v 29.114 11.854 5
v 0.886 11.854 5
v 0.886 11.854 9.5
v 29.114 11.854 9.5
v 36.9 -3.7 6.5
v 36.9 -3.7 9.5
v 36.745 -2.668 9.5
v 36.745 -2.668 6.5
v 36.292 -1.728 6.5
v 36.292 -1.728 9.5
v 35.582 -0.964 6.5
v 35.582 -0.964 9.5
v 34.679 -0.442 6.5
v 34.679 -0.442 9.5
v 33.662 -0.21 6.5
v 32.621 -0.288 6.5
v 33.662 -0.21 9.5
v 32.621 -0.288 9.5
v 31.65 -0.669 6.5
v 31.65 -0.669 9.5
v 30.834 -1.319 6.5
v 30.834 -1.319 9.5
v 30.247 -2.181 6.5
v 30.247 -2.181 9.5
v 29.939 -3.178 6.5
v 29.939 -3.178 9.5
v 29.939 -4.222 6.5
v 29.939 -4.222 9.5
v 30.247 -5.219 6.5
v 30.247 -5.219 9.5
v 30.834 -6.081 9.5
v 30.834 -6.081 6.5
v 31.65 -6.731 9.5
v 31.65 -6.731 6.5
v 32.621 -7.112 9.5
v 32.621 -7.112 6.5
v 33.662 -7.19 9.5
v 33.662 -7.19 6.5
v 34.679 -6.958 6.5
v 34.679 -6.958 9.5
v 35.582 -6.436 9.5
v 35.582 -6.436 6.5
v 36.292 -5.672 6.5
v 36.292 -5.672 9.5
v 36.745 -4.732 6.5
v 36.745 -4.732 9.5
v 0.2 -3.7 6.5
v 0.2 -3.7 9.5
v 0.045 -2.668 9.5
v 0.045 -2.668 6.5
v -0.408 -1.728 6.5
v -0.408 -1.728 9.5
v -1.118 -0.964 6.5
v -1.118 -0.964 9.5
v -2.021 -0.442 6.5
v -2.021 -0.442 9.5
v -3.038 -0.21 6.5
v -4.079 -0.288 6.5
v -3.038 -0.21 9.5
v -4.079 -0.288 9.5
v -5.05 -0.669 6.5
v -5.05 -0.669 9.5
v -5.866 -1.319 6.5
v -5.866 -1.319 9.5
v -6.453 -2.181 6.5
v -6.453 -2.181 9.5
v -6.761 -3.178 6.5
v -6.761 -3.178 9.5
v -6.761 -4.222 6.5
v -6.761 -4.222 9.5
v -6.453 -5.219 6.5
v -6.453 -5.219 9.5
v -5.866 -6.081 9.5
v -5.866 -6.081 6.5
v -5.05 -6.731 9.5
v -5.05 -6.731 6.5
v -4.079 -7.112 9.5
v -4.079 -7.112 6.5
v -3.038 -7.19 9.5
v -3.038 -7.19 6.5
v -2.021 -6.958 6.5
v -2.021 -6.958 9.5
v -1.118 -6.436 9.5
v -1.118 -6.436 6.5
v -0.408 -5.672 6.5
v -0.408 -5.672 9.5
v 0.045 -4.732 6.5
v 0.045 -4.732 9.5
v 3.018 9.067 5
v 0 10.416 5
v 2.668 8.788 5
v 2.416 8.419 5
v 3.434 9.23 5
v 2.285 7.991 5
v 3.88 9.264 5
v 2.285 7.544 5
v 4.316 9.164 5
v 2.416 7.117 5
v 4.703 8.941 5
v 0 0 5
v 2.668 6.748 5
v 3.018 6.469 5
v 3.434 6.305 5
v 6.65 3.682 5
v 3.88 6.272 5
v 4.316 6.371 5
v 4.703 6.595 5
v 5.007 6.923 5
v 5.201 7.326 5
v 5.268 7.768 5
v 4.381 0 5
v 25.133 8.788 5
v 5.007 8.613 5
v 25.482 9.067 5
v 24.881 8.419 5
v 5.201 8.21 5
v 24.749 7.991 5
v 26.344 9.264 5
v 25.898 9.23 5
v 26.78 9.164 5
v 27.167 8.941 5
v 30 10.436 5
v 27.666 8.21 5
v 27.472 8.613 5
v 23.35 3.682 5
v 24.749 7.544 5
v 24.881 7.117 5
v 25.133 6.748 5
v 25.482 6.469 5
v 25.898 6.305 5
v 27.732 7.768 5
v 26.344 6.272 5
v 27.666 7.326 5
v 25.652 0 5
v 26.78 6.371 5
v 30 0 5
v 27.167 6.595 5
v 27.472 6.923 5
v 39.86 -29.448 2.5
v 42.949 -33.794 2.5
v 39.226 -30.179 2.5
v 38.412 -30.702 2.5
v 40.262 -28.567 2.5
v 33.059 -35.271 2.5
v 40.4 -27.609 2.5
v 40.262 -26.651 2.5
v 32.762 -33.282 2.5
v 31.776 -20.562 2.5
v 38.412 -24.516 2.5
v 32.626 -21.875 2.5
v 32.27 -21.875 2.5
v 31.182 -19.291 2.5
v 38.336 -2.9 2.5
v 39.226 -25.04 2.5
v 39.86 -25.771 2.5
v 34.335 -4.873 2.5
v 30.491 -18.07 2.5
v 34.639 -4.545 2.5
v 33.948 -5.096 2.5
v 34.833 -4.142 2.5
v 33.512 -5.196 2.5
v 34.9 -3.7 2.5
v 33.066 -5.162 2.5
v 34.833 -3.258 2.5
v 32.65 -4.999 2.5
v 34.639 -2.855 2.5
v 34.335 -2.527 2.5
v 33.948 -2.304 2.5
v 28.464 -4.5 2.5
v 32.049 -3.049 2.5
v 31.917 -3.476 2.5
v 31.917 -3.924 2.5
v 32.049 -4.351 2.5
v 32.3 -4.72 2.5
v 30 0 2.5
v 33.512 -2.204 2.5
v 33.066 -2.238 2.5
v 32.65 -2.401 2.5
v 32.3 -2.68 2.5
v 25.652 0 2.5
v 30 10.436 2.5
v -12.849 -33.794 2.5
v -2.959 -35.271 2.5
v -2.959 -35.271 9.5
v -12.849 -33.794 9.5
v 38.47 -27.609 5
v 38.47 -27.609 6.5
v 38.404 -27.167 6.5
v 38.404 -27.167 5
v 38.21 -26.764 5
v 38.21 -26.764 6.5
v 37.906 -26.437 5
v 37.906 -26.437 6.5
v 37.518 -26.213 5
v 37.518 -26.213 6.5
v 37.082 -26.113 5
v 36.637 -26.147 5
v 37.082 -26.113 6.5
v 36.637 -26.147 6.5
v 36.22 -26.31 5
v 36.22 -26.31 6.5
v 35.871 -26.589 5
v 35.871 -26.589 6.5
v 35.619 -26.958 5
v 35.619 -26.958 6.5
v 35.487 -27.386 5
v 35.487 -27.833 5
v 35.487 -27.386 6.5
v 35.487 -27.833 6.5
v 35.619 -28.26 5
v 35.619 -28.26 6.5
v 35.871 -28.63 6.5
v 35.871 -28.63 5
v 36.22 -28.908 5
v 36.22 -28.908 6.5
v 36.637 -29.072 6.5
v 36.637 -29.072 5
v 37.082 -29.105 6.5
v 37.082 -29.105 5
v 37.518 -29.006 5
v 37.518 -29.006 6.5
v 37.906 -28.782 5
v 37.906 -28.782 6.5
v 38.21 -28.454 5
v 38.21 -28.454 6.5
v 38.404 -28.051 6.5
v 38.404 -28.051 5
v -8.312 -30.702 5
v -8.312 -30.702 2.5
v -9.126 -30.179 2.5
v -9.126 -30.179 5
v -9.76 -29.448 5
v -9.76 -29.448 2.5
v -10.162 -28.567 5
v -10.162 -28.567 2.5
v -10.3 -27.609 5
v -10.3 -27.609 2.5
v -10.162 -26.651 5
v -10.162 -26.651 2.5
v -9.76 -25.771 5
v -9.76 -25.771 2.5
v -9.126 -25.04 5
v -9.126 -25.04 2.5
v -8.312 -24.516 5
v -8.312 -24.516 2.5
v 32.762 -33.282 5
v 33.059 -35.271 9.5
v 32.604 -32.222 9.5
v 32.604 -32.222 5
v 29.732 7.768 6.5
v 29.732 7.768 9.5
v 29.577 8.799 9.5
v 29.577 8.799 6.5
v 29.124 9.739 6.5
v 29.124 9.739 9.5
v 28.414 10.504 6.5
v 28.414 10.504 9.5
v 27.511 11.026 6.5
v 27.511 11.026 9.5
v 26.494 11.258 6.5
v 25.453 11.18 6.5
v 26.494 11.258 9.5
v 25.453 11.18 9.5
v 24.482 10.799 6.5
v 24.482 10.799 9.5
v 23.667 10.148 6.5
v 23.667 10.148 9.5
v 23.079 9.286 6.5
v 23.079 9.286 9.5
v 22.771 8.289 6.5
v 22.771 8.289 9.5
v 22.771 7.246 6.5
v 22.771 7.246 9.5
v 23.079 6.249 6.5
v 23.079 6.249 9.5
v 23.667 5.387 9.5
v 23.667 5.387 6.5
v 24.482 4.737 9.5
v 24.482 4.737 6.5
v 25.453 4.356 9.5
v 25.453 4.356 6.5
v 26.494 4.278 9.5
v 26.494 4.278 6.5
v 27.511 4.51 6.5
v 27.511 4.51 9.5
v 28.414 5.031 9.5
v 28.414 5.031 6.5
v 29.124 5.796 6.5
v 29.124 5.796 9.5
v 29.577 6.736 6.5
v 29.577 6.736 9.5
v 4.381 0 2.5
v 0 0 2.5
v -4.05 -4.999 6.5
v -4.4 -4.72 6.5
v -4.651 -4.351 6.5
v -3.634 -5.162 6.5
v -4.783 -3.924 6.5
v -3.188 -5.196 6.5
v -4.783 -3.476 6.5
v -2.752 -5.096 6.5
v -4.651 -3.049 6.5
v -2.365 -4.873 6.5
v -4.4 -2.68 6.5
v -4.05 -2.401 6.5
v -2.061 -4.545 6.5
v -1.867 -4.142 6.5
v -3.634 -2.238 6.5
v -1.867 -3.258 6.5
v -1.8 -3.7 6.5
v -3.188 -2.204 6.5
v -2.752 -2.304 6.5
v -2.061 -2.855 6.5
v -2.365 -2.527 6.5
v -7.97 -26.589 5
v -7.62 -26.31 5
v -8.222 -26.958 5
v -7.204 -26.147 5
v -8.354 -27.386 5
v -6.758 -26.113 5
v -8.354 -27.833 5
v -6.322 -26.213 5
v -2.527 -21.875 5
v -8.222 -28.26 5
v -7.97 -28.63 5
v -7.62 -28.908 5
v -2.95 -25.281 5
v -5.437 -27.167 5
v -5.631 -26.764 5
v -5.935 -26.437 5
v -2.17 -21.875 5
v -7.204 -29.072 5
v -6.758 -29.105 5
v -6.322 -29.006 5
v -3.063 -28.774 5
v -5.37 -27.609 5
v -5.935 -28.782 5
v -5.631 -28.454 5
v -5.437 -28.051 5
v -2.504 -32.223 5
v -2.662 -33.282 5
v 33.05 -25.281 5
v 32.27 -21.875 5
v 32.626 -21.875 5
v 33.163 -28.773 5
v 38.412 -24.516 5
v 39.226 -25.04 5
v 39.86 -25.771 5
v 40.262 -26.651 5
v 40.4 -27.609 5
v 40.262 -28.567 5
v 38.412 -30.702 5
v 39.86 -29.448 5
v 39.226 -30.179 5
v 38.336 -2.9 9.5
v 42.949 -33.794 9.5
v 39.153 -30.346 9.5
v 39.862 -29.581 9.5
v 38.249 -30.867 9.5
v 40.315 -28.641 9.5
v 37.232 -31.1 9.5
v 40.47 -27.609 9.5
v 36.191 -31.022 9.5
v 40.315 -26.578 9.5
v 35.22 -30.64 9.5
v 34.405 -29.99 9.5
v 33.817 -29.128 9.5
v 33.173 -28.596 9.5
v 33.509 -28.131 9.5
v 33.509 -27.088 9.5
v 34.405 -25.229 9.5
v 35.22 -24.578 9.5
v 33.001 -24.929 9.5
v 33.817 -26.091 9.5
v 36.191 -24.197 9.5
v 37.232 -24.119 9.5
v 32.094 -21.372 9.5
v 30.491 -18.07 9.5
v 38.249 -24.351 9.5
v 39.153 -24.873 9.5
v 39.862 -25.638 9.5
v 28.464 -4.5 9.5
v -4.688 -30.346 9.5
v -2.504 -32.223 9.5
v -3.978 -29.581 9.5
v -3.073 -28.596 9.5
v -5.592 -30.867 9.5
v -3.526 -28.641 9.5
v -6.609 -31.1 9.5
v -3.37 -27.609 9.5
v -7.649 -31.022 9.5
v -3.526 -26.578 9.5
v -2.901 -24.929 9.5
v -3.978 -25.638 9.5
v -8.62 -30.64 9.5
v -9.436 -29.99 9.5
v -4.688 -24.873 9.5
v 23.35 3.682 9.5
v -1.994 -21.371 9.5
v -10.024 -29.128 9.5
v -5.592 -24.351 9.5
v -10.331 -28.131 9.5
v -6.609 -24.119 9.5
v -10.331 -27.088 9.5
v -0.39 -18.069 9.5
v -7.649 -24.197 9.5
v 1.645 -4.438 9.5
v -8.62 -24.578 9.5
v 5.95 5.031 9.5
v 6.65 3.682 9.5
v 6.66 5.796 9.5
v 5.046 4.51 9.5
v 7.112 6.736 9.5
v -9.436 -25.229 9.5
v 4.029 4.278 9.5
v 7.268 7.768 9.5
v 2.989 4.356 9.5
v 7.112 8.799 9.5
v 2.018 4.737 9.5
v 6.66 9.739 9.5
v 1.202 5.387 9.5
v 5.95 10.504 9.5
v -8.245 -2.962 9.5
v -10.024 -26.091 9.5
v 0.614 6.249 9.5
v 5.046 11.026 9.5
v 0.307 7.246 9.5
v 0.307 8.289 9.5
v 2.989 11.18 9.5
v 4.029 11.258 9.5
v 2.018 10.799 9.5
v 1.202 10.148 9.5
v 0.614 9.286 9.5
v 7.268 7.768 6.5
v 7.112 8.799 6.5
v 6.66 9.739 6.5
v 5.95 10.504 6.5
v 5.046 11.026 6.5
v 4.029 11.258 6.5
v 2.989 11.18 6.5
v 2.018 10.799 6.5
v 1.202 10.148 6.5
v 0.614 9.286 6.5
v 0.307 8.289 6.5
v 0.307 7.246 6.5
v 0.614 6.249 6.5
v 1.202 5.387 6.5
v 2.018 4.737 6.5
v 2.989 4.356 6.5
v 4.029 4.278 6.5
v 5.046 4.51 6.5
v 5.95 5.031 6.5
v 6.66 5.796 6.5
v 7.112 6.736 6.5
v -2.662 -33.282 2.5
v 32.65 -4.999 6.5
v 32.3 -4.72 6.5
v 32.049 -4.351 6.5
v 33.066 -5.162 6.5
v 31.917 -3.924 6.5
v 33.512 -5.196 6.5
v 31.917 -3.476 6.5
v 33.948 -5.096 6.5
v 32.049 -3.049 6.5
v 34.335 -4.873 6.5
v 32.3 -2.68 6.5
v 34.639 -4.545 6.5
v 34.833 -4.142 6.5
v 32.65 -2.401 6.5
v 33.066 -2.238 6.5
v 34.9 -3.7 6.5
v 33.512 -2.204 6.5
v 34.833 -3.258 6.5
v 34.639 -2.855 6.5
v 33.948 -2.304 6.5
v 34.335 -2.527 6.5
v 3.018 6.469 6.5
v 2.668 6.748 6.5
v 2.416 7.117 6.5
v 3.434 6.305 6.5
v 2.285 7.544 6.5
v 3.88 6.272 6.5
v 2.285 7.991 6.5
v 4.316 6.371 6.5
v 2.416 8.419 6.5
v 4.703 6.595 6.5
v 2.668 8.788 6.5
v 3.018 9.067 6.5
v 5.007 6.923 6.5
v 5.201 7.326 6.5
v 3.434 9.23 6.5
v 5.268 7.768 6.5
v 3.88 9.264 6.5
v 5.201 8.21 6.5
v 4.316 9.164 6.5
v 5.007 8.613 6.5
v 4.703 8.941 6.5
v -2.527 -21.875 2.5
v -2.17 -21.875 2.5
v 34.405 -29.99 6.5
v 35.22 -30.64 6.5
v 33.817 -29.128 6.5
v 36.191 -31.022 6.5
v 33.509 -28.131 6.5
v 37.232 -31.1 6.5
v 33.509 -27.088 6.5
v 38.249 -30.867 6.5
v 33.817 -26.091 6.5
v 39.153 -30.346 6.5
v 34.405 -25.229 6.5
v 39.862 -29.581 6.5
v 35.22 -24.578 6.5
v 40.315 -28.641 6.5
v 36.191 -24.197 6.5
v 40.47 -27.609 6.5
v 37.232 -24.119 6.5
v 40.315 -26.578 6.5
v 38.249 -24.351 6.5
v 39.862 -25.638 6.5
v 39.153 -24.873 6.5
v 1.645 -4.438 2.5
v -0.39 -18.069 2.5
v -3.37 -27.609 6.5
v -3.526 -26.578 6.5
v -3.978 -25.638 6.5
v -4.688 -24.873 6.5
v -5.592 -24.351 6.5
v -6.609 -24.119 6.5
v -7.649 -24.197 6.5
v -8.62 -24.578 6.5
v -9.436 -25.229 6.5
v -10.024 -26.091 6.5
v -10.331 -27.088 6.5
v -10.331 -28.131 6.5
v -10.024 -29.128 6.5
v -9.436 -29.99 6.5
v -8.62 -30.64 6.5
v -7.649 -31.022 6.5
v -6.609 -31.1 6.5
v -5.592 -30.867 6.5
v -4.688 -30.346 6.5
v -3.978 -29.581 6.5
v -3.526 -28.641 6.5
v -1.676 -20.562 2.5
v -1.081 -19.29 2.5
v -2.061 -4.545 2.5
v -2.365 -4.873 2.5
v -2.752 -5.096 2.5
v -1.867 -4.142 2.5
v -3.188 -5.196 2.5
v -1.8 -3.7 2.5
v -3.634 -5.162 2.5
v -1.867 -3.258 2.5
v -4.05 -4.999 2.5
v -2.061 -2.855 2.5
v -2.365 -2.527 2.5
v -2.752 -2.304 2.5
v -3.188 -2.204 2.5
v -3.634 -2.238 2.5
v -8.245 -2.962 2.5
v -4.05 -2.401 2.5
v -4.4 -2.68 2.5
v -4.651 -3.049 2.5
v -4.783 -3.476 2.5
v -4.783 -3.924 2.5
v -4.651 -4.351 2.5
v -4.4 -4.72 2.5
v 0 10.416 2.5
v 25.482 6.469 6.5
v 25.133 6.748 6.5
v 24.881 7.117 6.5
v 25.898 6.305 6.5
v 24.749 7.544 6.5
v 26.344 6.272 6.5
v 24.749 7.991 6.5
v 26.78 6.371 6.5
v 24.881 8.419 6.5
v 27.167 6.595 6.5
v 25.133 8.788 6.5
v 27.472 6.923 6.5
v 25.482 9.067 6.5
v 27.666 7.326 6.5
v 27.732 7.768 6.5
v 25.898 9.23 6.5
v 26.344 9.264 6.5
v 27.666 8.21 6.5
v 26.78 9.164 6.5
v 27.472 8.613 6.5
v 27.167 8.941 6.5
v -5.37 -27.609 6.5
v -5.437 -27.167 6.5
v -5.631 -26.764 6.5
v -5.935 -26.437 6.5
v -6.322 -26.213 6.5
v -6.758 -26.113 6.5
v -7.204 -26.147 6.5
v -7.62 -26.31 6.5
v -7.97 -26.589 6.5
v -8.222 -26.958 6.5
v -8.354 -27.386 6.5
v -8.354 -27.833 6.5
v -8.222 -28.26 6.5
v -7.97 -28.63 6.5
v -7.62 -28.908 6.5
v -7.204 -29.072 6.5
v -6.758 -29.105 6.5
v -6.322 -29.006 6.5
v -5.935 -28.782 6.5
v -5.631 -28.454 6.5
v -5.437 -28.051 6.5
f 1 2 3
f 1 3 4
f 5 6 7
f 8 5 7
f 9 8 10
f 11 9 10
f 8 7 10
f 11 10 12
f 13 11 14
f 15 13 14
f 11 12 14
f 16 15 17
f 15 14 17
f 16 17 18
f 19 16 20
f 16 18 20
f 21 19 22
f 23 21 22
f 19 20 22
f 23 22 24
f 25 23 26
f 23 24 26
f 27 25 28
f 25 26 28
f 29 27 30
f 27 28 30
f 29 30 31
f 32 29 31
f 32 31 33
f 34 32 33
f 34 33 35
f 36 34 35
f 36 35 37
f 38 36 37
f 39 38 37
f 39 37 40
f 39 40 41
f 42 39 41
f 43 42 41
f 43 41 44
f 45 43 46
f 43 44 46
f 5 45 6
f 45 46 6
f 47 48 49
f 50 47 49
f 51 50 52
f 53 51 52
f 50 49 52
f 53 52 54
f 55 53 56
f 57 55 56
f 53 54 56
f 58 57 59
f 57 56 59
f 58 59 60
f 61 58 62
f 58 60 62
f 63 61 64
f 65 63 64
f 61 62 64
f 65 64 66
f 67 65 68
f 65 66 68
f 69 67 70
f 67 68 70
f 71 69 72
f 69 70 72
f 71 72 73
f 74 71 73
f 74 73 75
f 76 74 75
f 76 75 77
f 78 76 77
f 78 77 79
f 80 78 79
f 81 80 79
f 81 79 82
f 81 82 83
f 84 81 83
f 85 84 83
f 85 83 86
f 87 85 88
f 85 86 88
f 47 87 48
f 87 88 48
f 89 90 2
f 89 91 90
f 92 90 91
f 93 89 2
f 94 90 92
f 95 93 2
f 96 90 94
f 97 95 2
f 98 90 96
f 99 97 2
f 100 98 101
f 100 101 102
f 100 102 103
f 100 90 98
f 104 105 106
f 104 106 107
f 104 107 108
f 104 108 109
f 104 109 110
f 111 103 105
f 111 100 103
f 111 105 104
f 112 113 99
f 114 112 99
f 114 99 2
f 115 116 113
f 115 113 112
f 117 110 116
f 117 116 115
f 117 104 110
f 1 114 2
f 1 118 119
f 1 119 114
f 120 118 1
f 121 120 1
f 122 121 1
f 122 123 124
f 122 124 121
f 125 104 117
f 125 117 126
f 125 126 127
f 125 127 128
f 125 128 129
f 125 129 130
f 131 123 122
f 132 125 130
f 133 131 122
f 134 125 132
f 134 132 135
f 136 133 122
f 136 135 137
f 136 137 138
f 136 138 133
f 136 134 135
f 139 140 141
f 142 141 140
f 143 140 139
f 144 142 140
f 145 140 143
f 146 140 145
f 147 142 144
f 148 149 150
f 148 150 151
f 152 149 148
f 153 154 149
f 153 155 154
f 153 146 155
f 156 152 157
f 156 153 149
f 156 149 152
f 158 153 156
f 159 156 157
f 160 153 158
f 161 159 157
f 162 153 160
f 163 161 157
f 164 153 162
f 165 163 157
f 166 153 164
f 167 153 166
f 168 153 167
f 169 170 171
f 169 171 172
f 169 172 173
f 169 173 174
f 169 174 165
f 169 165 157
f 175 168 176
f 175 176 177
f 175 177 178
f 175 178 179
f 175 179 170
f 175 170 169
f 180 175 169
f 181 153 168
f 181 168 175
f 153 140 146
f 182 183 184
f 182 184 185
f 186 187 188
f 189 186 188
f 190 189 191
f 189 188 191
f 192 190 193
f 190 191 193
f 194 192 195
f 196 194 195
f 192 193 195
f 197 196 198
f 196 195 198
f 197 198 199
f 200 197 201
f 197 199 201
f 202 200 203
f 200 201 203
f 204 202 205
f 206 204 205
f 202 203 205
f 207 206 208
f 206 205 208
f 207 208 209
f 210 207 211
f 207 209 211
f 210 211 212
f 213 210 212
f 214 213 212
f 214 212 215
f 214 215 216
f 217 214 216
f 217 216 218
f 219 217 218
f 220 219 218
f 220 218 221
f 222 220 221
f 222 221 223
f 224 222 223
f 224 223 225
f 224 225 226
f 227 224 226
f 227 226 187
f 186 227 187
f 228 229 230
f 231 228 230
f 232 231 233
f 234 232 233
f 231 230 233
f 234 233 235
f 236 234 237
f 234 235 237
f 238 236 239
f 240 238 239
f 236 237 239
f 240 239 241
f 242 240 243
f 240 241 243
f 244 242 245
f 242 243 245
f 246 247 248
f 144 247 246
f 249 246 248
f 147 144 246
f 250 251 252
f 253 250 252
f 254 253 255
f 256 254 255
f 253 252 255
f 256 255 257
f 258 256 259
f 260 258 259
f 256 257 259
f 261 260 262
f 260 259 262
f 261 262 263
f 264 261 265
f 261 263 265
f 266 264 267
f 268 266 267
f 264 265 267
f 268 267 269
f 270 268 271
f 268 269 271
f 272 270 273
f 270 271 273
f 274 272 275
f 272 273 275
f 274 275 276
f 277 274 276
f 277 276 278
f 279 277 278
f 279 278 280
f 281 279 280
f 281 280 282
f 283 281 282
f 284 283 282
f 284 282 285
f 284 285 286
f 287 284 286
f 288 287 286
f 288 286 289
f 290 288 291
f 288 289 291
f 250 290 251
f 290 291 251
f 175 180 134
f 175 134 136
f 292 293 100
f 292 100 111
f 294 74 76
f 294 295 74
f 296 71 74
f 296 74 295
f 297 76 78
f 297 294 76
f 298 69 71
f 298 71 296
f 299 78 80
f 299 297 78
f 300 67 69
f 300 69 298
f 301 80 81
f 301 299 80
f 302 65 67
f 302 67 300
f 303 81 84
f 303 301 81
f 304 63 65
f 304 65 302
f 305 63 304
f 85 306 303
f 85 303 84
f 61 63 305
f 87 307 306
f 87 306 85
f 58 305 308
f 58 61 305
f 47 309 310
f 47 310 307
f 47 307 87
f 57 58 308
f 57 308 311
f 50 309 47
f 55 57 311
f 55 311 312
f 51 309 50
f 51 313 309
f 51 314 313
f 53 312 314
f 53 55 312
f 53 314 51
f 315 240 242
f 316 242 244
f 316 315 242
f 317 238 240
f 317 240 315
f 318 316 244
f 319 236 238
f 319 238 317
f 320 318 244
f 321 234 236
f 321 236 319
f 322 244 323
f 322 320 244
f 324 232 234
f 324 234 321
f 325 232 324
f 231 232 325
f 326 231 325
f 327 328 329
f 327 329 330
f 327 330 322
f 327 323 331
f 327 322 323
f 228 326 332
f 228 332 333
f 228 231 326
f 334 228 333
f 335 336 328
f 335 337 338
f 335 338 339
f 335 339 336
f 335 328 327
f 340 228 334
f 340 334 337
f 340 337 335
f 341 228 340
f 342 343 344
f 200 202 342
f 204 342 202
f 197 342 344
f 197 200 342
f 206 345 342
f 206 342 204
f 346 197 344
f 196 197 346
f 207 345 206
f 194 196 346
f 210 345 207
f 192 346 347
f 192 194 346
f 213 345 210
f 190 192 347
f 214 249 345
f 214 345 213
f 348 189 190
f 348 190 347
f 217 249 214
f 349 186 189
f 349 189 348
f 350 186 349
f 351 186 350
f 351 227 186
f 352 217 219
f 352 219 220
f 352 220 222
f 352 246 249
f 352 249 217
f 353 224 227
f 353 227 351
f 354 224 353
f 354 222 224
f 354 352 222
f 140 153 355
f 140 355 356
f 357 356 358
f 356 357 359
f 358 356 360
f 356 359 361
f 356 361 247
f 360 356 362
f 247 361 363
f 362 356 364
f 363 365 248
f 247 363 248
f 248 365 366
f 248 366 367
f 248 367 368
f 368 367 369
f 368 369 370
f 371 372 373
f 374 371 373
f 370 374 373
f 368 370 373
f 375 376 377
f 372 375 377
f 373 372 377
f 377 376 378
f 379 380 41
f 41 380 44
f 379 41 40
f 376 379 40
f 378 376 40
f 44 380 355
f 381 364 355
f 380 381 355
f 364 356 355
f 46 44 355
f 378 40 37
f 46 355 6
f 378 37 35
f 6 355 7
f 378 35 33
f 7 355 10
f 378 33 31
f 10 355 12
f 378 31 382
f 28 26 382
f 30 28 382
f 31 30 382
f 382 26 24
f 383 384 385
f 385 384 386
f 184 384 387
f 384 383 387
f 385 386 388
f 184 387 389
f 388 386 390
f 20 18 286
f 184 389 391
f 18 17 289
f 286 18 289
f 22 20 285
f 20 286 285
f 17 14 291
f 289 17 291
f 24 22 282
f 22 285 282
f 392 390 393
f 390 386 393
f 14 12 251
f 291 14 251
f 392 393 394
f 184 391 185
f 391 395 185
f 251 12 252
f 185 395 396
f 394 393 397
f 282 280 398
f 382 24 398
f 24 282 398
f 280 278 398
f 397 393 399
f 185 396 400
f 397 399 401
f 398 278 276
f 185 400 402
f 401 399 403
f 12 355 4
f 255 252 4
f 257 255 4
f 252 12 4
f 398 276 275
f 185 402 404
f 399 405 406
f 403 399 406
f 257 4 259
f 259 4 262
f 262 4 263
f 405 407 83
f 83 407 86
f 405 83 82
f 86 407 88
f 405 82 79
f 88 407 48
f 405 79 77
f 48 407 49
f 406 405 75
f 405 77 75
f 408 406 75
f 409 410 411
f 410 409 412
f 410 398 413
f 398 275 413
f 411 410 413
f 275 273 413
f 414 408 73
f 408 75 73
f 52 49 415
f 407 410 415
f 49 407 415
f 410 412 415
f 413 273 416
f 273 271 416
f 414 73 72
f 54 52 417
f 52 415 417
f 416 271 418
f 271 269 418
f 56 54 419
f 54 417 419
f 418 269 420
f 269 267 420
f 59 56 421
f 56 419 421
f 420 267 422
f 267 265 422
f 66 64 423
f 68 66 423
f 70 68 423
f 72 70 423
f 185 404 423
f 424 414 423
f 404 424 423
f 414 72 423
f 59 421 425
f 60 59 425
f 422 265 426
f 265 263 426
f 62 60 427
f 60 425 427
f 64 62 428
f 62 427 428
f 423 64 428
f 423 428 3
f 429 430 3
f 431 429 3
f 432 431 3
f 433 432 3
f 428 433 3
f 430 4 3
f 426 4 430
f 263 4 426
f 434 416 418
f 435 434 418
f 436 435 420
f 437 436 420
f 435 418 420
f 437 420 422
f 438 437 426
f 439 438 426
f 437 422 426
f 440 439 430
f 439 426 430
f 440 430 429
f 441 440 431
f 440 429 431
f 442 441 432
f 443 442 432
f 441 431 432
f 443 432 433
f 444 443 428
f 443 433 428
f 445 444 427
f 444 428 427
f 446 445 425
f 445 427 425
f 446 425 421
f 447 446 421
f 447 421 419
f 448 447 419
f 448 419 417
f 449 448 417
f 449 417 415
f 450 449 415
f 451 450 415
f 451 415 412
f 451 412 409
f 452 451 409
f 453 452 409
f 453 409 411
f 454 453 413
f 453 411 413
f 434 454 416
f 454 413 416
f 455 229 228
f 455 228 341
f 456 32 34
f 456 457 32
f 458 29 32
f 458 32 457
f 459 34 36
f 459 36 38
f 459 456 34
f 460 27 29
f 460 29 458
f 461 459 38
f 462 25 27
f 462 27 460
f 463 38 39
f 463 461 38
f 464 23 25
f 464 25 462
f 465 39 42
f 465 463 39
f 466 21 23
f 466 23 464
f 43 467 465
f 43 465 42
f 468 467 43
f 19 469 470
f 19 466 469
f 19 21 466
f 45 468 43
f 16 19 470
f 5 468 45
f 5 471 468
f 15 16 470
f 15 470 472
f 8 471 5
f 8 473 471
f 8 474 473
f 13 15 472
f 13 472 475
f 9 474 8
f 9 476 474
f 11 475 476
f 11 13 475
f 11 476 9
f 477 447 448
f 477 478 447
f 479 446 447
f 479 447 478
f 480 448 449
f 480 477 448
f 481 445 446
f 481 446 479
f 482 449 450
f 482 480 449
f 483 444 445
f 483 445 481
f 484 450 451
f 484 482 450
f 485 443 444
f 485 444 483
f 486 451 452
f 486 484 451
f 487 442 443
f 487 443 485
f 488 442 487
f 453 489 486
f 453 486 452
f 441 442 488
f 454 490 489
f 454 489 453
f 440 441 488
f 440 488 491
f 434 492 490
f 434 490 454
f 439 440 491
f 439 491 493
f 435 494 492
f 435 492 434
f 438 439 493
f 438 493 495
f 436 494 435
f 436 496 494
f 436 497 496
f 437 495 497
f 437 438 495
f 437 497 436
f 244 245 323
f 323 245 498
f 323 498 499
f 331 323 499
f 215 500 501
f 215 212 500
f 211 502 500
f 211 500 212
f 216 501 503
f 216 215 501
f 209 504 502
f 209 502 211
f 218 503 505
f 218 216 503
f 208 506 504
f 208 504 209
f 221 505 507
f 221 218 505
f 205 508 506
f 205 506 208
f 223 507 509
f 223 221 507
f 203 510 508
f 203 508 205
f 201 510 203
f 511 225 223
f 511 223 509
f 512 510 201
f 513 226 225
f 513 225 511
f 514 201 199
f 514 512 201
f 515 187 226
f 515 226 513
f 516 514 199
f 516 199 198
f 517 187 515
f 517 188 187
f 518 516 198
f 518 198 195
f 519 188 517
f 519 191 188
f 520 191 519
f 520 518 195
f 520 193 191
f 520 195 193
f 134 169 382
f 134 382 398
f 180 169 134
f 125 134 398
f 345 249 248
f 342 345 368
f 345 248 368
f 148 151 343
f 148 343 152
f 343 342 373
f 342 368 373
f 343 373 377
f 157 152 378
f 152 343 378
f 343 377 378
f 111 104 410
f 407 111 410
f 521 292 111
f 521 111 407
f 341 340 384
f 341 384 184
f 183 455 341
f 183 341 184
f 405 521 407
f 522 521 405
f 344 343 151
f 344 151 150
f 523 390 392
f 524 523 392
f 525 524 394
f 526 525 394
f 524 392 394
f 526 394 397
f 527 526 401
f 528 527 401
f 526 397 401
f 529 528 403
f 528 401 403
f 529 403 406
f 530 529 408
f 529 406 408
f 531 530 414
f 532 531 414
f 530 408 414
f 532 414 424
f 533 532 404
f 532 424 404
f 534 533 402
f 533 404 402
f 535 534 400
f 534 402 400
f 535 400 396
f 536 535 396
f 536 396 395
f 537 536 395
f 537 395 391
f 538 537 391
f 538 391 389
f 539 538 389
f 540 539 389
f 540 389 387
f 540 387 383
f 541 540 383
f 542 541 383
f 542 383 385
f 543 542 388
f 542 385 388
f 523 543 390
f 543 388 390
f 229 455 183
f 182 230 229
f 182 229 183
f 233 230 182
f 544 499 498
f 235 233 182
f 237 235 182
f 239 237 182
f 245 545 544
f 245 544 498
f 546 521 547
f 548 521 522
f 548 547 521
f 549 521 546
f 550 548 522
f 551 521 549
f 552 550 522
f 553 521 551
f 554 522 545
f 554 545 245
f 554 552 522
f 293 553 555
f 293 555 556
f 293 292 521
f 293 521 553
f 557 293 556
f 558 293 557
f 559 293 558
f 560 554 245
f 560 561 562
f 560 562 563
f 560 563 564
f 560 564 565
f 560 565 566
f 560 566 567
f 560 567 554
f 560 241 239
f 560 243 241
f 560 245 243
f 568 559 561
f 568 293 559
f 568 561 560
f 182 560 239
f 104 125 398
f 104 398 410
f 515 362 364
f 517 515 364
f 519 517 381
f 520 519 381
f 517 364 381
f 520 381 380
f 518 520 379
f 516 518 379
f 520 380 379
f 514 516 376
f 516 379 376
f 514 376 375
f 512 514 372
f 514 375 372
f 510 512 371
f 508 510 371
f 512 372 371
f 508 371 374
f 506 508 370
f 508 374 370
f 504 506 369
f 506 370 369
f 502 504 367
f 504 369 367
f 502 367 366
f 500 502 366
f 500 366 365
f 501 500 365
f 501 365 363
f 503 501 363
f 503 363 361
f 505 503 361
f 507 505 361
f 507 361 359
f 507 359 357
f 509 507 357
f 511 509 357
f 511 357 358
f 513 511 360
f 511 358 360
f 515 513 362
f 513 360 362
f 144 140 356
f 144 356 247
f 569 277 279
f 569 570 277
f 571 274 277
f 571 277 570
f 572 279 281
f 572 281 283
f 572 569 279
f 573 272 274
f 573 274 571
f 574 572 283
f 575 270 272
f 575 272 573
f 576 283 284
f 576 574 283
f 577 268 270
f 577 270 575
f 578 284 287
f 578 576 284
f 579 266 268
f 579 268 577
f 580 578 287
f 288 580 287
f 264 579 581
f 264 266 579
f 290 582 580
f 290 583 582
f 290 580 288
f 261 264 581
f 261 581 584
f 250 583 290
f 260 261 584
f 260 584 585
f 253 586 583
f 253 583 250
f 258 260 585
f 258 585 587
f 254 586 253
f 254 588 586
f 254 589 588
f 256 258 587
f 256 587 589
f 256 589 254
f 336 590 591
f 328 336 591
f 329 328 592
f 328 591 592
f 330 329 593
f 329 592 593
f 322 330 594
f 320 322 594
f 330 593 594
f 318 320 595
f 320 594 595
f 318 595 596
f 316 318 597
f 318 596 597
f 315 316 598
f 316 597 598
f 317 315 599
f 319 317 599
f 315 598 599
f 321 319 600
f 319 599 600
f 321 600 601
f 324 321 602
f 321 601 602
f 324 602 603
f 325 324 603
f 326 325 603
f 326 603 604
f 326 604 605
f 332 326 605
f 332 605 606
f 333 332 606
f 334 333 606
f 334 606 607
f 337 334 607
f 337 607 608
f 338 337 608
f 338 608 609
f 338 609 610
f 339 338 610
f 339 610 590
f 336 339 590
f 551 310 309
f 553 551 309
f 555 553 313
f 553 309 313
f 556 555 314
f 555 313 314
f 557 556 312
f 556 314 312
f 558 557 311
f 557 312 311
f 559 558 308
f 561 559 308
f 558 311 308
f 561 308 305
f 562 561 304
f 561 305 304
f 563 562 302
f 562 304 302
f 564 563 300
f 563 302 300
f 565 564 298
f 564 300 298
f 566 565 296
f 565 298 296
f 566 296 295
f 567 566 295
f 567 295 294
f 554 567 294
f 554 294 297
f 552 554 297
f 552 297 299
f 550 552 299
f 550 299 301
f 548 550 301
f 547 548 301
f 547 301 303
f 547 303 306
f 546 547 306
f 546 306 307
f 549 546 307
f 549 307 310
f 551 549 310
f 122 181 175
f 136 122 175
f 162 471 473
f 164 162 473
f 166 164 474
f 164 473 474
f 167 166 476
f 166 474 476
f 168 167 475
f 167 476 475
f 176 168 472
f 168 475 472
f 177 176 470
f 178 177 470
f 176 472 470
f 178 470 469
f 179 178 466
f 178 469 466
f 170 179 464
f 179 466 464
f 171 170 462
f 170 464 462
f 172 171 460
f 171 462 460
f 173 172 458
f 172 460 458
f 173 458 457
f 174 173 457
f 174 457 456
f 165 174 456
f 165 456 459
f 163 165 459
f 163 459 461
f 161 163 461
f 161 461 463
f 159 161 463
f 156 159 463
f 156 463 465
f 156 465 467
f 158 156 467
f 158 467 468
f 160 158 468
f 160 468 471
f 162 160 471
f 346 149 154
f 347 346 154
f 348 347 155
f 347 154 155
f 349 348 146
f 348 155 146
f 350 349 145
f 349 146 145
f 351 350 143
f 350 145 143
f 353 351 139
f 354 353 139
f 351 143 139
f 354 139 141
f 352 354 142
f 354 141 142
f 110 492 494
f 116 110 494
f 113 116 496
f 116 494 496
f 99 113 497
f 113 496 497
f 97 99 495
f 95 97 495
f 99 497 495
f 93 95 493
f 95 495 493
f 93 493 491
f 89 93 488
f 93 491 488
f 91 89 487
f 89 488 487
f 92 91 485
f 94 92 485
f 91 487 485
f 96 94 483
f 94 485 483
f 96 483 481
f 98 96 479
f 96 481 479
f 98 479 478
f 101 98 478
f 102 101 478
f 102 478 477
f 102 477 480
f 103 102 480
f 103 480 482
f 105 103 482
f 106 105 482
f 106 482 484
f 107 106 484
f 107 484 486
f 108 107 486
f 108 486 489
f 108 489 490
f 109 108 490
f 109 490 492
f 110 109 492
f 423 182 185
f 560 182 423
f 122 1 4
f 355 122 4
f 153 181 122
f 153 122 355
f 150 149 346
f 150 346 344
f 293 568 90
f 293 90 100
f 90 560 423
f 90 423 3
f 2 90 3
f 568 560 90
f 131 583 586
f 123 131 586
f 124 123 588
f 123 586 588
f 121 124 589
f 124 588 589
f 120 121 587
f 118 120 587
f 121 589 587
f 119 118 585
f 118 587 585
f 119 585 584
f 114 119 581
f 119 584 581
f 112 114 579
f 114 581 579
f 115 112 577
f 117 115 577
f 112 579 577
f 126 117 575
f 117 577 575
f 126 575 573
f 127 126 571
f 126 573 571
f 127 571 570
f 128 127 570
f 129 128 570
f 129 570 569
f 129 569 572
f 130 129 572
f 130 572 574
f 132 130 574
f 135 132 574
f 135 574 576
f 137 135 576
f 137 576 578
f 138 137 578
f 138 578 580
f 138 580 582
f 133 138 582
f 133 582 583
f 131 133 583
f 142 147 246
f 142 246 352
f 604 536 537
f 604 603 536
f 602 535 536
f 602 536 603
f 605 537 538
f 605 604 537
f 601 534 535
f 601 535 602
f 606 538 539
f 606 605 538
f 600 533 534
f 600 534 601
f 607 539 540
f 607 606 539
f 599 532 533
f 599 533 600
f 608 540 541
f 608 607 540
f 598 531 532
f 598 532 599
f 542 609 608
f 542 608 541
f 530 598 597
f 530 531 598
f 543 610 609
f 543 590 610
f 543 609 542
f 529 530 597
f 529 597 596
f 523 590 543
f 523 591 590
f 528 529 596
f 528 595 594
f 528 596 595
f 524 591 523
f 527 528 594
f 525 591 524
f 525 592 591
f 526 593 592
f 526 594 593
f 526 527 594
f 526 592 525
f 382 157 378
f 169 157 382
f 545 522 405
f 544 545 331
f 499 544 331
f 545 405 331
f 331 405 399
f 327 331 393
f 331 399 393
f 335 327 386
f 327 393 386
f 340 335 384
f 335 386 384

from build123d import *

# Parameters (mm, degrees)
PAD020_DEPTH    = 7
SKETCH043_W     = 30
SKETCH043_H     = 11.8536046546
POCKET018_DEPTH = 2.5
SKETCH044_R     = 1.5
POCKET019_DEPTH = 10
SKETCH045_R     = 3.5
POCKET020_DEPTH = 3
SKETCH046_R     = 18.15
POCKET021_DEPTH = 10
POCKET022_DEPTH = 2.5


with BuildPart() as part:
    # Sketch042 → Pad020 (new body)
    with BuildSketch(Plane.XY):
        Polygon((-12.8493066257, -33.7940933811), (-8.2452066191, -2.9618052463), (0.8857658642, 11.8536046546), (29.1142341358, 11.8536046546), (38.335521046, -2.8996050949), (42.948959357, -33.794429076), (33.0593993066, -35.2712096281), (28.4644789539, -4.5003949051), (23.3502319582, 3.6819292513), (6.6497680418, 3.6819292513), (1.6452066191, -4.4381947537), (-2.9589691174, -35.2709900288), align=None)
    extrude(amount=PAD020_DEPTH)

    # Sketch043 (on Face13 of Pad020) → Pocket018 (cut)
    with BuildSketch(Plane(origin=(0, 0, 0), x_dir=(1, 0, 0), z_dir=(0, 0, -1))):
        with Locations((15, -5.9268023273)):
            Rectangle(SKETCH043_W, SKETCH043_H)
    extrude(amount=-POCKET018_DEPTH, mode=Mode.SUBTRACT)

    # Sketch044 (on Face5 of Pocket018) → Pocket019 (cut)
    with BuildSketch(Plane.XY.offset(7)):
        with Locations((3.767766953, 7.767766953)):
            Circle(SKETCH044_R)
        with Locations((26.232233047, 7.767766953)):
            Circle(SKETCH044_R)
        with Locations((-6.8703102168, -27.60930544)):
            Circle(SKETCH044_R)
        with Locations((36.9703102168, -27.60930544)):
            Circle(SKETCH044_R)
        with Locations((33.4, -3.7)):
            Circle(SKETCH044_R)
        with Locations((-3.3, -3.7)):
            Circle(SKETCH044_R)
    extrude(amount=-POCKET019_DEPTH, mode=Mode.SUBTRACT)

    # Sketch045 (on Face5 of Pocket019) → Pocket020 (cut)
    with BuildSketch(Plane.XY.offset(7)):
        with Locations((36.9703102168, -27.60930544)):
            Circle(SKETCH045_R)
        with Locations((33.4, -3.7)):
            Circle(SKETCH045_R)
        with Locations((26.232233047, 7.767766953)):
            Circle(SKETCH045_R)
        with Locations((3.767766953, 7.767766953)):
            Circle(SKETCH045_R)
        with Locations((-3.3, -3.7)):
            Circle(SKETCH045_R)
        with Locations((-6.8703102168, -27.60930544)):
            Circle(SKETCH045_R)
    extrude(amount=-POCKET020_DEPTH, mode=Mode.SUBTRACT)

    # Sketch046 (on Face5 of Pocket020) → Pocket021 (cut)
    with BuildSketch(Plane.XY.offset(7)):
        with Locations((15.05, -27.60930544)):
            Circle(SKETCH046_R)
    extrude(amount=-POCKET021_DEPTH, mode=Mode.SUBTRACT)

    # Sketch047 (on Face4 of Pocket021) → Pocket022 (cut)
    with BuildSketch(Plane(origin=(0, 0, 0), x_dir=(1, 0, 0), z_dir=(0, 0, -1))):
        with BuildLine():
            ThreePointArc((-8.3120846255, 30.7022032745), (-10.3000000009, 27.6093139691), (-8.3121001429, 24.5164146902))
            Line((-8.3121001429, 24.5164146902), (-2.5265008251, 21.8749228678))
            Line((-2.5265008251, 21.8749228678), (32.6264961364, 21.8749207273))
            Line((38.4120727539, 24.5164021866), (32.6264961364, 21.8749207273))
            ThreePointArc((38.4120727539, 24.5164021867), (40.3999999994, 27.6092903858), (38.4121001427, 30.7021961887))
            Line((32.6265008251, 33.3436880121), (38.4121001427, 30.7021961887))
            Line((-2.5265008251, 33.3436880122), (32.6265008251, 33.3436880121))
            Line((-8.3120846255, 30.7022032745), (-2.5265008251, 33.3436880122))
        make_face()
    extrude(amount=-POCKET022_DEPTH, mode=Mode.SUBTRACT)


with BuildPart() as part_1:
    # Body005 placement: moved
    add(part.part.moved(Location((0, 0, 2.5))))


solid = part_1.part
